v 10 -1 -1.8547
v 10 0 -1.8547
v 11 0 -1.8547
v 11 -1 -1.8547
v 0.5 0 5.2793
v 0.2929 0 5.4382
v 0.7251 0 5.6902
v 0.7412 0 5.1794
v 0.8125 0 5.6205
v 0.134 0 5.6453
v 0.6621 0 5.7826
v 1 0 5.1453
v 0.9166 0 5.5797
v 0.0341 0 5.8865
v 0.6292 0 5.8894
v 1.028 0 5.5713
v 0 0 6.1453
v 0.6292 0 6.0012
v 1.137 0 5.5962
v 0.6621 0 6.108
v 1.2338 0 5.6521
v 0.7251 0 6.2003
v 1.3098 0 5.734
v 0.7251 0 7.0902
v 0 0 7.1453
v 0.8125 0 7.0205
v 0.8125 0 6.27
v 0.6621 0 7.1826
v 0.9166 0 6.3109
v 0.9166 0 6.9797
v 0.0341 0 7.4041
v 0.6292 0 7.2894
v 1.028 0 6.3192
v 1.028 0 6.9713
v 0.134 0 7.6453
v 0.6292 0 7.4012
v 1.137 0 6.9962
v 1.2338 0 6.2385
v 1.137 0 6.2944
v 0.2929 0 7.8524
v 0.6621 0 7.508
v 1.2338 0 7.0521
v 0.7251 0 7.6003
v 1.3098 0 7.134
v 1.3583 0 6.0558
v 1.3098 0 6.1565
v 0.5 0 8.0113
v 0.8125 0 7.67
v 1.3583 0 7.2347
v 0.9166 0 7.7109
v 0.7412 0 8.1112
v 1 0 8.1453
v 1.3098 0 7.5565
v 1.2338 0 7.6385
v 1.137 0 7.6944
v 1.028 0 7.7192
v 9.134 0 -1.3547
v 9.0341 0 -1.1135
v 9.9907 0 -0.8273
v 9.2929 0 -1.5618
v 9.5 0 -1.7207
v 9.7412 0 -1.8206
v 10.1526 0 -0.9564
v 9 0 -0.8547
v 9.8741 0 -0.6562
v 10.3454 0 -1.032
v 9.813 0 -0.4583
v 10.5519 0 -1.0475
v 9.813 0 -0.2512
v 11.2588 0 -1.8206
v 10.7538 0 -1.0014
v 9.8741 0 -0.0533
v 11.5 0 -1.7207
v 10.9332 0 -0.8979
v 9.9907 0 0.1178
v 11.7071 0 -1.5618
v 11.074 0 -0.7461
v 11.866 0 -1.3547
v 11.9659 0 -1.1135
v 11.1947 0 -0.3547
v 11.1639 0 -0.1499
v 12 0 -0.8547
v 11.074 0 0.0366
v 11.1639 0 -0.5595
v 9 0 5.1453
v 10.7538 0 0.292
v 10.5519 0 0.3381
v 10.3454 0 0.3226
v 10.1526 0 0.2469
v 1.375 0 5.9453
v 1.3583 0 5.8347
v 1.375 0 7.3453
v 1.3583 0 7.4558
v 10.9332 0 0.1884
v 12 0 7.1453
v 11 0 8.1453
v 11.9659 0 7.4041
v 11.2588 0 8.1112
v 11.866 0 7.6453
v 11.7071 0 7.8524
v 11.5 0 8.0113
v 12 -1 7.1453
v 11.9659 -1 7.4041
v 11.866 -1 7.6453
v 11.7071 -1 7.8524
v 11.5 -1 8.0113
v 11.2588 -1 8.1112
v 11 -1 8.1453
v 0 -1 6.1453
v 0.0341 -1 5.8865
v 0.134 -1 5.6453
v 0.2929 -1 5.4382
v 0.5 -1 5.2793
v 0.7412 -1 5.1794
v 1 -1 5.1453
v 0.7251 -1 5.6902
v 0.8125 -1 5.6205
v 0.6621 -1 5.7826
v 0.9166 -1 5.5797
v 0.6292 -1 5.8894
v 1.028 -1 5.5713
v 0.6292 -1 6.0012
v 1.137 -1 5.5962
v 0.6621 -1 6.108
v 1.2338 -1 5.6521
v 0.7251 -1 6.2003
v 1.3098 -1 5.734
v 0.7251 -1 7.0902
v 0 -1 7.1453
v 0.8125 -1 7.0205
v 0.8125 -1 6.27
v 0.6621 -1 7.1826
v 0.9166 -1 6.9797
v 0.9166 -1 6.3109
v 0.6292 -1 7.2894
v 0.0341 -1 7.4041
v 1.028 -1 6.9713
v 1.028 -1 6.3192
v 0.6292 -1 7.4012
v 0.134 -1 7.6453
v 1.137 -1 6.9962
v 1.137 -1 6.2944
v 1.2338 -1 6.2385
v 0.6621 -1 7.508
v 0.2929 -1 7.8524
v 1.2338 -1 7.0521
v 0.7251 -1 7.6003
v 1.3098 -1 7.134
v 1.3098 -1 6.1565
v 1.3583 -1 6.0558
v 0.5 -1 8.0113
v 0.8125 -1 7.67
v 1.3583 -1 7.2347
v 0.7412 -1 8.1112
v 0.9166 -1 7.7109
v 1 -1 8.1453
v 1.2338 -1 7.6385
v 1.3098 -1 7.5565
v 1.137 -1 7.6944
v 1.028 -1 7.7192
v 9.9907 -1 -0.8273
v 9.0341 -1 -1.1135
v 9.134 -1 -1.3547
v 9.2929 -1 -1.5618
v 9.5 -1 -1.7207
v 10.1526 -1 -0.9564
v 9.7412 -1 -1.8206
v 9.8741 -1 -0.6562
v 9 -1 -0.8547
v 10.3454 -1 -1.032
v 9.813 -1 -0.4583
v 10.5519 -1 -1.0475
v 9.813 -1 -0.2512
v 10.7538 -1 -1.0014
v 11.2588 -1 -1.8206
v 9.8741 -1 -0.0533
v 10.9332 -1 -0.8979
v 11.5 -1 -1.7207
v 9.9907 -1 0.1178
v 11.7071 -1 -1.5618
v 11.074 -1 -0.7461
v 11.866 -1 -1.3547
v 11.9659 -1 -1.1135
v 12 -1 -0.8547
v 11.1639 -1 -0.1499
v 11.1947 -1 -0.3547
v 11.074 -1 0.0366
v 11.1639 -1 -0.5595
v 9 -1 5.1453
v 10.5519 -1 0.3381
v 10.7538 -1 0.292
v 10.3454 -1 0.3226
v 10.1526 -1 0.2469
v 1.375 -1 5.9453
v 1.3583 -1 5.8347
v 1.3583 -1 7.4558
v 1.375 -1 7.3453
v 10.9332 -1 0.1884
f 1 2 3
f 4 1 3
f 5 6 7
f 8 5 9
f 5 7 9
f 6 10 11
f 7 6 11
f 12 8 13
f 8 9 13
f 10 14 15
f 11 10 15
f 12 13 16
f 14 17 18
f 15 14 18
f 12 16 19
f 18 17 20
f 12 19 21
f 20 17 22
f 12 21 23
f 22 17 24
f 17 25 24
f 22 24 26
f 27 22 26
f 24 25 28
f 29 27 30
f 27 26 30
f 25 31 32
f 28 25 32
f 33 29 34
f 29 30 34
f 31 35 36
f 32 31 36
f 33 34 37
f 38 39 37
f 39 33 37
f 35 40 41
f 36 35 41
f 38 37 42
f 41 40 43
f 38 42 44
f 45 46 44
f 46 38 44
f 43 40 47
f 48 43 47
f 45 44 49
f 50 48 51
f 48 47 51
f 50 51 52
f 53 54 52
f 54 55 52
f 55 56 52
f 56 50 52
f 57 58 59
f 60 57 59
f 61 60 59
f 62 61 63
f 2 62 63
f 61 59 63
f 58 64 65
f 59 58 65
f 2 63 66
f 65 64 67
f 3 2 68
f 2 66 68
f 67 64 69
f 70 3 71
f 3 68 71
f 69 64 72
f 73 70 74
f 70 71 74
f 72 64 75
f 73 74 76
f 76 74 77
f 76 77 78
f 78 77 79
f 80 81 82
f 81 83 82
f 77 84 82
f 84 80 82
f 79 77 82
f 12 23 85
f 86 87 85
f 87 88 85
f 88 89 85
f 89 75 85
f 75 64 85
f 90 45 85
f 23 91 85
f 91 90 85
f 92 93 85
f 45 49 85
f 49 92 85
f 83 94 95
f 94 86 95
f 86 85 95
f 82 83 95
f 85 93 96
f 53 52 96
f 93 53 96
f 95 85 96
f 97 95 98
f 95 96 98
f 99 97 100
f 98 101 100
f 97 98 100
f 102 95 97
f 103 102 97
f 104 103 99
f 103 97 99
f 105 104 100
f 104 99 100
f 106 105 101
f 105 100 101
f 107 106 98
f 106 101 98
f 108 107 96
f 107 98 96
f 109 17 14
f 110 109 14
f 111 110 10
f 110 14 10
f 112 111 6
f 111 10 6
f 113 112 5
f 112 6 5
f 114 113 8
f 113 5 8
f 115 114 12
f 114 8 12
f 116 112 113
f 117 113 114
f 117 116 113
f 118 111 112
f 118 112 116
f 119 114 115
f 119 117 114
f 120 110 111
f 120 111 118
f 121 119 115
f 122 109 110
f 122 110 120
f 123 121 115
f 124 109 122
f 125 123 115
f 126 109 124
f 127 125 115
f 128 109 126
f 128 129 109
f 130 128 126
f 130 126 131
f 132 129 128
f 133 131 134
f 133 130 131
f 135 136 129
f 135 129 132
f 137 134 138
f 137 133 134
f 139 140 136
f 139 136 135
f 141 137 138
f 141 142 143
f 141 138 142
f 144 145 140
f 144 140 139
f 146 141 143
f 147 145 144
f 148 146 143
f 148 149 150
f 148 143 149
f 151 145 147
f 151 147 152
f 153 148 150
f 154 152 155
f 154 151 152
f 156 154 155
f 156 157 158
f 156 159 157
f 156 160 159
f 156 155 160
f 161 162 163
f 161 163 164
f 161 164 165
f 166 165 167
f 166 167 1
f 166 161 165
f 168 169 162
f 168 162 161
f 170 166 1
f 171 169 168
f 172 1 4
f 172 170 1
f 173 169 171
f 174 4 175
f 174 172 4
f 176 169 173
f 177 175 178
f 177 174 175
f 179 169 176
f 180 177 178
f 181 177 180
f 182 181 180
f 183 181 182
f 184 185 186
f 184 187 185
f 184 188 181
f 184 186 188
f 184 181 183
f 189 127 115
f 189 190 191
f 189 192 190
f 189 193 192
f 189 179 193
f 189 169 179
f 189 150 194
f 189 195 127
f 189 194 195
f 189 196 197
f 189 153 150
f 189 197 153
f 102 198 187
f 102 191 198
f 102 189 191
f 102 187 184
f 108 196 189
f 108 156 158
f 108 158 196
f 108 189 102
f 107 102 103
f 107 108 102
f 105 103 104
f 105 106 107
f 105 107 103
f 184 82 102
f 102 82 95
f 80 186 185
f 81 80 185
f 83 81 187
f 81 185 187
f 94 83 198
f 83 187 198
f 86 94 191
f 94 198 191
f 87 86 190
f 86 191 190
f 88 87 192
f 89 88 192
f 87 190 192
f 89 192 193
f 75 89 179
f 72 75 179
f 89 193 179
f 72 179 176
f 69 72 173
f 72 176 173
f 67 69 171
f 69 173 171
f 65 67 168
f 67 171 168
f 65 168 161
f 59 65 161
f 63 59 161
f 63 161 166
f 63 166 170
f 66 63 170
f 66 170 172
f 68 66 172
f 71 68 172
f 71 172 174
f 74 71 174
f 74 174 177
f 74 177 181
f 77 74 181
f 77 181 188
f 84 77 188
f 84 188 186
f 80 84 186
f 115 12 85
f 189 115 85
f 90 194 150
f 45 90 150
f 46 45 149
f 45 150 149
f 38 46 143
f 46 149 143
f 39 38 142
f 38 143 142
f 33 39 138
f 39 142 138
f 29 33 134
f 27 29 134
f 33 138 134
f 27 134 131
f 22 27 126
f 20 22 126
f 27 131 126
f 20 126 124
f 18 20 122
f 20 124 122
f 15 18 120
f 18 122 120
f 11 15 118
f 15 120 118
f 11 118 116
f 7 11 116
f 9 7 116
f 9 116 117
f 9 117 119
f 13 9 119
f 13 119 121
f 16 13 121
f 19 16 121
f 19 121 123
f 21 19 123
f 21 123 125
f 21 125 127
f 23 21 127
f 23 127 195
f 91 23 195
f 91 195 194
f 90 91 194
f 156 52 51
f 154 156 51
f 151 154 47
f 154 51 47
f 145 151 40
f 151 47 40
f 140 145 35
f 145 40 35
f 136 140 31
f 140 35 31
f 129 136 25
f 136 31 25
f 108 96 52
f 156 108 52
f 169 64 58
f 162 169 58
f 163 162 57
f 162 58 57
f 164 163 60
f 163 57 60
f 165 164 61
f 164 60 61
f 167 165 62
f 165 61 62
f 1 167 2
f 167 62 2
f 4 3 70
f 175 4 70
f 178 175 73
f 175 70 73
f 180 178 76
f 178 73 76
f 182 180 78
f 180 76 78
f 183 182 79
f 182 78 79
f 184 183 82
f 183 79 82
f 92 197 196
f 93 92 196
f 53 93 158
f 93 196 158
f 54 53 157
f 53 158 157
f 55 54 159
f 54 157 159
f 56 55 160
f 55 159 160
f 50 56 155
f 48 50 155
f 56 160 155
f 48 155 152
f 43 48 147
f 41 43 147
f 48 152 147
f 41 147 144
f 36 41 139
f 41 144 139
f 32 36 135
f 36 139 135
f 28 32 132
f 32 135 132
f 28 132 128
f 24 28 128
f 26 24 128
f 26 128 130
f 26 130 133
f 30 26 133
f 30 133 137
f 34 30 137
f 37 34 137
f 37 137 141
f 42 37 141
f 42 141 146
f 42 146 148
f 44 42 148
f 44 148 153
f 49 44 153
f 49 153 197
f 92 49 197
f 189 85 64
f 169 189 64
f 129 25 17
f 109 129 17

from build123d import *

# Parameters (mm, degrees)
F1_DEPTH = 1
F3_R     = 0.375
F3_R_2   = 0.694729
F4_DEPTH = 25


with BuildPart() as f1:
    # F0 (on Front) → F1 (new body)
    with BuildSketch(Plane.XZ):
        with BuildLine():
            ThreePointArc((0, 6.145281), (0.292893, 5.438174), (1, 5.145281))
            Line((1, 5.145281), (9, 5.145281))
            Line((9, 5.145281), (9, -0.854719))
            ThreePointArc((9, -0.854719), (9.292893, -1.561826), (10, -1.854719))
            Line((10, -1.854719), (11, -1.854719))
            ThreePointArc((11, -1.854719), (11.707107, -1.561826), (12, -0.854719))
            Line((12, -0.854719), (12, 7.145281))
            ThreePointArc((12, 7.145281), (11.707107, 7.852388), (11, 8.145281))
            Line((11, 8.145281), (1, 8.145281))
            ThreePointArc((1, 8.145281), (0.292893, 7.852388), (0, 7.145281))
            Line((0, 7.145281), (0, 6.145281))
        make_face()
    extrude(amount=F1_DEPTH)

    # F3 (on face) → F4 (cut)
    with BuildSketch(Plane.XZ.offset(1)):
        with Locations((1, 7.345281)):
            Circle(F3_R)
        with Locations((1, 5.945281)):
            Circle(F3_R)
        with Locations((10.5, -0.354719)):
            Circle(F3_R_2)
    extrude(amount=-F4_DEPTH, mode=Mode.SUBTRACT)


solid = f1.part
